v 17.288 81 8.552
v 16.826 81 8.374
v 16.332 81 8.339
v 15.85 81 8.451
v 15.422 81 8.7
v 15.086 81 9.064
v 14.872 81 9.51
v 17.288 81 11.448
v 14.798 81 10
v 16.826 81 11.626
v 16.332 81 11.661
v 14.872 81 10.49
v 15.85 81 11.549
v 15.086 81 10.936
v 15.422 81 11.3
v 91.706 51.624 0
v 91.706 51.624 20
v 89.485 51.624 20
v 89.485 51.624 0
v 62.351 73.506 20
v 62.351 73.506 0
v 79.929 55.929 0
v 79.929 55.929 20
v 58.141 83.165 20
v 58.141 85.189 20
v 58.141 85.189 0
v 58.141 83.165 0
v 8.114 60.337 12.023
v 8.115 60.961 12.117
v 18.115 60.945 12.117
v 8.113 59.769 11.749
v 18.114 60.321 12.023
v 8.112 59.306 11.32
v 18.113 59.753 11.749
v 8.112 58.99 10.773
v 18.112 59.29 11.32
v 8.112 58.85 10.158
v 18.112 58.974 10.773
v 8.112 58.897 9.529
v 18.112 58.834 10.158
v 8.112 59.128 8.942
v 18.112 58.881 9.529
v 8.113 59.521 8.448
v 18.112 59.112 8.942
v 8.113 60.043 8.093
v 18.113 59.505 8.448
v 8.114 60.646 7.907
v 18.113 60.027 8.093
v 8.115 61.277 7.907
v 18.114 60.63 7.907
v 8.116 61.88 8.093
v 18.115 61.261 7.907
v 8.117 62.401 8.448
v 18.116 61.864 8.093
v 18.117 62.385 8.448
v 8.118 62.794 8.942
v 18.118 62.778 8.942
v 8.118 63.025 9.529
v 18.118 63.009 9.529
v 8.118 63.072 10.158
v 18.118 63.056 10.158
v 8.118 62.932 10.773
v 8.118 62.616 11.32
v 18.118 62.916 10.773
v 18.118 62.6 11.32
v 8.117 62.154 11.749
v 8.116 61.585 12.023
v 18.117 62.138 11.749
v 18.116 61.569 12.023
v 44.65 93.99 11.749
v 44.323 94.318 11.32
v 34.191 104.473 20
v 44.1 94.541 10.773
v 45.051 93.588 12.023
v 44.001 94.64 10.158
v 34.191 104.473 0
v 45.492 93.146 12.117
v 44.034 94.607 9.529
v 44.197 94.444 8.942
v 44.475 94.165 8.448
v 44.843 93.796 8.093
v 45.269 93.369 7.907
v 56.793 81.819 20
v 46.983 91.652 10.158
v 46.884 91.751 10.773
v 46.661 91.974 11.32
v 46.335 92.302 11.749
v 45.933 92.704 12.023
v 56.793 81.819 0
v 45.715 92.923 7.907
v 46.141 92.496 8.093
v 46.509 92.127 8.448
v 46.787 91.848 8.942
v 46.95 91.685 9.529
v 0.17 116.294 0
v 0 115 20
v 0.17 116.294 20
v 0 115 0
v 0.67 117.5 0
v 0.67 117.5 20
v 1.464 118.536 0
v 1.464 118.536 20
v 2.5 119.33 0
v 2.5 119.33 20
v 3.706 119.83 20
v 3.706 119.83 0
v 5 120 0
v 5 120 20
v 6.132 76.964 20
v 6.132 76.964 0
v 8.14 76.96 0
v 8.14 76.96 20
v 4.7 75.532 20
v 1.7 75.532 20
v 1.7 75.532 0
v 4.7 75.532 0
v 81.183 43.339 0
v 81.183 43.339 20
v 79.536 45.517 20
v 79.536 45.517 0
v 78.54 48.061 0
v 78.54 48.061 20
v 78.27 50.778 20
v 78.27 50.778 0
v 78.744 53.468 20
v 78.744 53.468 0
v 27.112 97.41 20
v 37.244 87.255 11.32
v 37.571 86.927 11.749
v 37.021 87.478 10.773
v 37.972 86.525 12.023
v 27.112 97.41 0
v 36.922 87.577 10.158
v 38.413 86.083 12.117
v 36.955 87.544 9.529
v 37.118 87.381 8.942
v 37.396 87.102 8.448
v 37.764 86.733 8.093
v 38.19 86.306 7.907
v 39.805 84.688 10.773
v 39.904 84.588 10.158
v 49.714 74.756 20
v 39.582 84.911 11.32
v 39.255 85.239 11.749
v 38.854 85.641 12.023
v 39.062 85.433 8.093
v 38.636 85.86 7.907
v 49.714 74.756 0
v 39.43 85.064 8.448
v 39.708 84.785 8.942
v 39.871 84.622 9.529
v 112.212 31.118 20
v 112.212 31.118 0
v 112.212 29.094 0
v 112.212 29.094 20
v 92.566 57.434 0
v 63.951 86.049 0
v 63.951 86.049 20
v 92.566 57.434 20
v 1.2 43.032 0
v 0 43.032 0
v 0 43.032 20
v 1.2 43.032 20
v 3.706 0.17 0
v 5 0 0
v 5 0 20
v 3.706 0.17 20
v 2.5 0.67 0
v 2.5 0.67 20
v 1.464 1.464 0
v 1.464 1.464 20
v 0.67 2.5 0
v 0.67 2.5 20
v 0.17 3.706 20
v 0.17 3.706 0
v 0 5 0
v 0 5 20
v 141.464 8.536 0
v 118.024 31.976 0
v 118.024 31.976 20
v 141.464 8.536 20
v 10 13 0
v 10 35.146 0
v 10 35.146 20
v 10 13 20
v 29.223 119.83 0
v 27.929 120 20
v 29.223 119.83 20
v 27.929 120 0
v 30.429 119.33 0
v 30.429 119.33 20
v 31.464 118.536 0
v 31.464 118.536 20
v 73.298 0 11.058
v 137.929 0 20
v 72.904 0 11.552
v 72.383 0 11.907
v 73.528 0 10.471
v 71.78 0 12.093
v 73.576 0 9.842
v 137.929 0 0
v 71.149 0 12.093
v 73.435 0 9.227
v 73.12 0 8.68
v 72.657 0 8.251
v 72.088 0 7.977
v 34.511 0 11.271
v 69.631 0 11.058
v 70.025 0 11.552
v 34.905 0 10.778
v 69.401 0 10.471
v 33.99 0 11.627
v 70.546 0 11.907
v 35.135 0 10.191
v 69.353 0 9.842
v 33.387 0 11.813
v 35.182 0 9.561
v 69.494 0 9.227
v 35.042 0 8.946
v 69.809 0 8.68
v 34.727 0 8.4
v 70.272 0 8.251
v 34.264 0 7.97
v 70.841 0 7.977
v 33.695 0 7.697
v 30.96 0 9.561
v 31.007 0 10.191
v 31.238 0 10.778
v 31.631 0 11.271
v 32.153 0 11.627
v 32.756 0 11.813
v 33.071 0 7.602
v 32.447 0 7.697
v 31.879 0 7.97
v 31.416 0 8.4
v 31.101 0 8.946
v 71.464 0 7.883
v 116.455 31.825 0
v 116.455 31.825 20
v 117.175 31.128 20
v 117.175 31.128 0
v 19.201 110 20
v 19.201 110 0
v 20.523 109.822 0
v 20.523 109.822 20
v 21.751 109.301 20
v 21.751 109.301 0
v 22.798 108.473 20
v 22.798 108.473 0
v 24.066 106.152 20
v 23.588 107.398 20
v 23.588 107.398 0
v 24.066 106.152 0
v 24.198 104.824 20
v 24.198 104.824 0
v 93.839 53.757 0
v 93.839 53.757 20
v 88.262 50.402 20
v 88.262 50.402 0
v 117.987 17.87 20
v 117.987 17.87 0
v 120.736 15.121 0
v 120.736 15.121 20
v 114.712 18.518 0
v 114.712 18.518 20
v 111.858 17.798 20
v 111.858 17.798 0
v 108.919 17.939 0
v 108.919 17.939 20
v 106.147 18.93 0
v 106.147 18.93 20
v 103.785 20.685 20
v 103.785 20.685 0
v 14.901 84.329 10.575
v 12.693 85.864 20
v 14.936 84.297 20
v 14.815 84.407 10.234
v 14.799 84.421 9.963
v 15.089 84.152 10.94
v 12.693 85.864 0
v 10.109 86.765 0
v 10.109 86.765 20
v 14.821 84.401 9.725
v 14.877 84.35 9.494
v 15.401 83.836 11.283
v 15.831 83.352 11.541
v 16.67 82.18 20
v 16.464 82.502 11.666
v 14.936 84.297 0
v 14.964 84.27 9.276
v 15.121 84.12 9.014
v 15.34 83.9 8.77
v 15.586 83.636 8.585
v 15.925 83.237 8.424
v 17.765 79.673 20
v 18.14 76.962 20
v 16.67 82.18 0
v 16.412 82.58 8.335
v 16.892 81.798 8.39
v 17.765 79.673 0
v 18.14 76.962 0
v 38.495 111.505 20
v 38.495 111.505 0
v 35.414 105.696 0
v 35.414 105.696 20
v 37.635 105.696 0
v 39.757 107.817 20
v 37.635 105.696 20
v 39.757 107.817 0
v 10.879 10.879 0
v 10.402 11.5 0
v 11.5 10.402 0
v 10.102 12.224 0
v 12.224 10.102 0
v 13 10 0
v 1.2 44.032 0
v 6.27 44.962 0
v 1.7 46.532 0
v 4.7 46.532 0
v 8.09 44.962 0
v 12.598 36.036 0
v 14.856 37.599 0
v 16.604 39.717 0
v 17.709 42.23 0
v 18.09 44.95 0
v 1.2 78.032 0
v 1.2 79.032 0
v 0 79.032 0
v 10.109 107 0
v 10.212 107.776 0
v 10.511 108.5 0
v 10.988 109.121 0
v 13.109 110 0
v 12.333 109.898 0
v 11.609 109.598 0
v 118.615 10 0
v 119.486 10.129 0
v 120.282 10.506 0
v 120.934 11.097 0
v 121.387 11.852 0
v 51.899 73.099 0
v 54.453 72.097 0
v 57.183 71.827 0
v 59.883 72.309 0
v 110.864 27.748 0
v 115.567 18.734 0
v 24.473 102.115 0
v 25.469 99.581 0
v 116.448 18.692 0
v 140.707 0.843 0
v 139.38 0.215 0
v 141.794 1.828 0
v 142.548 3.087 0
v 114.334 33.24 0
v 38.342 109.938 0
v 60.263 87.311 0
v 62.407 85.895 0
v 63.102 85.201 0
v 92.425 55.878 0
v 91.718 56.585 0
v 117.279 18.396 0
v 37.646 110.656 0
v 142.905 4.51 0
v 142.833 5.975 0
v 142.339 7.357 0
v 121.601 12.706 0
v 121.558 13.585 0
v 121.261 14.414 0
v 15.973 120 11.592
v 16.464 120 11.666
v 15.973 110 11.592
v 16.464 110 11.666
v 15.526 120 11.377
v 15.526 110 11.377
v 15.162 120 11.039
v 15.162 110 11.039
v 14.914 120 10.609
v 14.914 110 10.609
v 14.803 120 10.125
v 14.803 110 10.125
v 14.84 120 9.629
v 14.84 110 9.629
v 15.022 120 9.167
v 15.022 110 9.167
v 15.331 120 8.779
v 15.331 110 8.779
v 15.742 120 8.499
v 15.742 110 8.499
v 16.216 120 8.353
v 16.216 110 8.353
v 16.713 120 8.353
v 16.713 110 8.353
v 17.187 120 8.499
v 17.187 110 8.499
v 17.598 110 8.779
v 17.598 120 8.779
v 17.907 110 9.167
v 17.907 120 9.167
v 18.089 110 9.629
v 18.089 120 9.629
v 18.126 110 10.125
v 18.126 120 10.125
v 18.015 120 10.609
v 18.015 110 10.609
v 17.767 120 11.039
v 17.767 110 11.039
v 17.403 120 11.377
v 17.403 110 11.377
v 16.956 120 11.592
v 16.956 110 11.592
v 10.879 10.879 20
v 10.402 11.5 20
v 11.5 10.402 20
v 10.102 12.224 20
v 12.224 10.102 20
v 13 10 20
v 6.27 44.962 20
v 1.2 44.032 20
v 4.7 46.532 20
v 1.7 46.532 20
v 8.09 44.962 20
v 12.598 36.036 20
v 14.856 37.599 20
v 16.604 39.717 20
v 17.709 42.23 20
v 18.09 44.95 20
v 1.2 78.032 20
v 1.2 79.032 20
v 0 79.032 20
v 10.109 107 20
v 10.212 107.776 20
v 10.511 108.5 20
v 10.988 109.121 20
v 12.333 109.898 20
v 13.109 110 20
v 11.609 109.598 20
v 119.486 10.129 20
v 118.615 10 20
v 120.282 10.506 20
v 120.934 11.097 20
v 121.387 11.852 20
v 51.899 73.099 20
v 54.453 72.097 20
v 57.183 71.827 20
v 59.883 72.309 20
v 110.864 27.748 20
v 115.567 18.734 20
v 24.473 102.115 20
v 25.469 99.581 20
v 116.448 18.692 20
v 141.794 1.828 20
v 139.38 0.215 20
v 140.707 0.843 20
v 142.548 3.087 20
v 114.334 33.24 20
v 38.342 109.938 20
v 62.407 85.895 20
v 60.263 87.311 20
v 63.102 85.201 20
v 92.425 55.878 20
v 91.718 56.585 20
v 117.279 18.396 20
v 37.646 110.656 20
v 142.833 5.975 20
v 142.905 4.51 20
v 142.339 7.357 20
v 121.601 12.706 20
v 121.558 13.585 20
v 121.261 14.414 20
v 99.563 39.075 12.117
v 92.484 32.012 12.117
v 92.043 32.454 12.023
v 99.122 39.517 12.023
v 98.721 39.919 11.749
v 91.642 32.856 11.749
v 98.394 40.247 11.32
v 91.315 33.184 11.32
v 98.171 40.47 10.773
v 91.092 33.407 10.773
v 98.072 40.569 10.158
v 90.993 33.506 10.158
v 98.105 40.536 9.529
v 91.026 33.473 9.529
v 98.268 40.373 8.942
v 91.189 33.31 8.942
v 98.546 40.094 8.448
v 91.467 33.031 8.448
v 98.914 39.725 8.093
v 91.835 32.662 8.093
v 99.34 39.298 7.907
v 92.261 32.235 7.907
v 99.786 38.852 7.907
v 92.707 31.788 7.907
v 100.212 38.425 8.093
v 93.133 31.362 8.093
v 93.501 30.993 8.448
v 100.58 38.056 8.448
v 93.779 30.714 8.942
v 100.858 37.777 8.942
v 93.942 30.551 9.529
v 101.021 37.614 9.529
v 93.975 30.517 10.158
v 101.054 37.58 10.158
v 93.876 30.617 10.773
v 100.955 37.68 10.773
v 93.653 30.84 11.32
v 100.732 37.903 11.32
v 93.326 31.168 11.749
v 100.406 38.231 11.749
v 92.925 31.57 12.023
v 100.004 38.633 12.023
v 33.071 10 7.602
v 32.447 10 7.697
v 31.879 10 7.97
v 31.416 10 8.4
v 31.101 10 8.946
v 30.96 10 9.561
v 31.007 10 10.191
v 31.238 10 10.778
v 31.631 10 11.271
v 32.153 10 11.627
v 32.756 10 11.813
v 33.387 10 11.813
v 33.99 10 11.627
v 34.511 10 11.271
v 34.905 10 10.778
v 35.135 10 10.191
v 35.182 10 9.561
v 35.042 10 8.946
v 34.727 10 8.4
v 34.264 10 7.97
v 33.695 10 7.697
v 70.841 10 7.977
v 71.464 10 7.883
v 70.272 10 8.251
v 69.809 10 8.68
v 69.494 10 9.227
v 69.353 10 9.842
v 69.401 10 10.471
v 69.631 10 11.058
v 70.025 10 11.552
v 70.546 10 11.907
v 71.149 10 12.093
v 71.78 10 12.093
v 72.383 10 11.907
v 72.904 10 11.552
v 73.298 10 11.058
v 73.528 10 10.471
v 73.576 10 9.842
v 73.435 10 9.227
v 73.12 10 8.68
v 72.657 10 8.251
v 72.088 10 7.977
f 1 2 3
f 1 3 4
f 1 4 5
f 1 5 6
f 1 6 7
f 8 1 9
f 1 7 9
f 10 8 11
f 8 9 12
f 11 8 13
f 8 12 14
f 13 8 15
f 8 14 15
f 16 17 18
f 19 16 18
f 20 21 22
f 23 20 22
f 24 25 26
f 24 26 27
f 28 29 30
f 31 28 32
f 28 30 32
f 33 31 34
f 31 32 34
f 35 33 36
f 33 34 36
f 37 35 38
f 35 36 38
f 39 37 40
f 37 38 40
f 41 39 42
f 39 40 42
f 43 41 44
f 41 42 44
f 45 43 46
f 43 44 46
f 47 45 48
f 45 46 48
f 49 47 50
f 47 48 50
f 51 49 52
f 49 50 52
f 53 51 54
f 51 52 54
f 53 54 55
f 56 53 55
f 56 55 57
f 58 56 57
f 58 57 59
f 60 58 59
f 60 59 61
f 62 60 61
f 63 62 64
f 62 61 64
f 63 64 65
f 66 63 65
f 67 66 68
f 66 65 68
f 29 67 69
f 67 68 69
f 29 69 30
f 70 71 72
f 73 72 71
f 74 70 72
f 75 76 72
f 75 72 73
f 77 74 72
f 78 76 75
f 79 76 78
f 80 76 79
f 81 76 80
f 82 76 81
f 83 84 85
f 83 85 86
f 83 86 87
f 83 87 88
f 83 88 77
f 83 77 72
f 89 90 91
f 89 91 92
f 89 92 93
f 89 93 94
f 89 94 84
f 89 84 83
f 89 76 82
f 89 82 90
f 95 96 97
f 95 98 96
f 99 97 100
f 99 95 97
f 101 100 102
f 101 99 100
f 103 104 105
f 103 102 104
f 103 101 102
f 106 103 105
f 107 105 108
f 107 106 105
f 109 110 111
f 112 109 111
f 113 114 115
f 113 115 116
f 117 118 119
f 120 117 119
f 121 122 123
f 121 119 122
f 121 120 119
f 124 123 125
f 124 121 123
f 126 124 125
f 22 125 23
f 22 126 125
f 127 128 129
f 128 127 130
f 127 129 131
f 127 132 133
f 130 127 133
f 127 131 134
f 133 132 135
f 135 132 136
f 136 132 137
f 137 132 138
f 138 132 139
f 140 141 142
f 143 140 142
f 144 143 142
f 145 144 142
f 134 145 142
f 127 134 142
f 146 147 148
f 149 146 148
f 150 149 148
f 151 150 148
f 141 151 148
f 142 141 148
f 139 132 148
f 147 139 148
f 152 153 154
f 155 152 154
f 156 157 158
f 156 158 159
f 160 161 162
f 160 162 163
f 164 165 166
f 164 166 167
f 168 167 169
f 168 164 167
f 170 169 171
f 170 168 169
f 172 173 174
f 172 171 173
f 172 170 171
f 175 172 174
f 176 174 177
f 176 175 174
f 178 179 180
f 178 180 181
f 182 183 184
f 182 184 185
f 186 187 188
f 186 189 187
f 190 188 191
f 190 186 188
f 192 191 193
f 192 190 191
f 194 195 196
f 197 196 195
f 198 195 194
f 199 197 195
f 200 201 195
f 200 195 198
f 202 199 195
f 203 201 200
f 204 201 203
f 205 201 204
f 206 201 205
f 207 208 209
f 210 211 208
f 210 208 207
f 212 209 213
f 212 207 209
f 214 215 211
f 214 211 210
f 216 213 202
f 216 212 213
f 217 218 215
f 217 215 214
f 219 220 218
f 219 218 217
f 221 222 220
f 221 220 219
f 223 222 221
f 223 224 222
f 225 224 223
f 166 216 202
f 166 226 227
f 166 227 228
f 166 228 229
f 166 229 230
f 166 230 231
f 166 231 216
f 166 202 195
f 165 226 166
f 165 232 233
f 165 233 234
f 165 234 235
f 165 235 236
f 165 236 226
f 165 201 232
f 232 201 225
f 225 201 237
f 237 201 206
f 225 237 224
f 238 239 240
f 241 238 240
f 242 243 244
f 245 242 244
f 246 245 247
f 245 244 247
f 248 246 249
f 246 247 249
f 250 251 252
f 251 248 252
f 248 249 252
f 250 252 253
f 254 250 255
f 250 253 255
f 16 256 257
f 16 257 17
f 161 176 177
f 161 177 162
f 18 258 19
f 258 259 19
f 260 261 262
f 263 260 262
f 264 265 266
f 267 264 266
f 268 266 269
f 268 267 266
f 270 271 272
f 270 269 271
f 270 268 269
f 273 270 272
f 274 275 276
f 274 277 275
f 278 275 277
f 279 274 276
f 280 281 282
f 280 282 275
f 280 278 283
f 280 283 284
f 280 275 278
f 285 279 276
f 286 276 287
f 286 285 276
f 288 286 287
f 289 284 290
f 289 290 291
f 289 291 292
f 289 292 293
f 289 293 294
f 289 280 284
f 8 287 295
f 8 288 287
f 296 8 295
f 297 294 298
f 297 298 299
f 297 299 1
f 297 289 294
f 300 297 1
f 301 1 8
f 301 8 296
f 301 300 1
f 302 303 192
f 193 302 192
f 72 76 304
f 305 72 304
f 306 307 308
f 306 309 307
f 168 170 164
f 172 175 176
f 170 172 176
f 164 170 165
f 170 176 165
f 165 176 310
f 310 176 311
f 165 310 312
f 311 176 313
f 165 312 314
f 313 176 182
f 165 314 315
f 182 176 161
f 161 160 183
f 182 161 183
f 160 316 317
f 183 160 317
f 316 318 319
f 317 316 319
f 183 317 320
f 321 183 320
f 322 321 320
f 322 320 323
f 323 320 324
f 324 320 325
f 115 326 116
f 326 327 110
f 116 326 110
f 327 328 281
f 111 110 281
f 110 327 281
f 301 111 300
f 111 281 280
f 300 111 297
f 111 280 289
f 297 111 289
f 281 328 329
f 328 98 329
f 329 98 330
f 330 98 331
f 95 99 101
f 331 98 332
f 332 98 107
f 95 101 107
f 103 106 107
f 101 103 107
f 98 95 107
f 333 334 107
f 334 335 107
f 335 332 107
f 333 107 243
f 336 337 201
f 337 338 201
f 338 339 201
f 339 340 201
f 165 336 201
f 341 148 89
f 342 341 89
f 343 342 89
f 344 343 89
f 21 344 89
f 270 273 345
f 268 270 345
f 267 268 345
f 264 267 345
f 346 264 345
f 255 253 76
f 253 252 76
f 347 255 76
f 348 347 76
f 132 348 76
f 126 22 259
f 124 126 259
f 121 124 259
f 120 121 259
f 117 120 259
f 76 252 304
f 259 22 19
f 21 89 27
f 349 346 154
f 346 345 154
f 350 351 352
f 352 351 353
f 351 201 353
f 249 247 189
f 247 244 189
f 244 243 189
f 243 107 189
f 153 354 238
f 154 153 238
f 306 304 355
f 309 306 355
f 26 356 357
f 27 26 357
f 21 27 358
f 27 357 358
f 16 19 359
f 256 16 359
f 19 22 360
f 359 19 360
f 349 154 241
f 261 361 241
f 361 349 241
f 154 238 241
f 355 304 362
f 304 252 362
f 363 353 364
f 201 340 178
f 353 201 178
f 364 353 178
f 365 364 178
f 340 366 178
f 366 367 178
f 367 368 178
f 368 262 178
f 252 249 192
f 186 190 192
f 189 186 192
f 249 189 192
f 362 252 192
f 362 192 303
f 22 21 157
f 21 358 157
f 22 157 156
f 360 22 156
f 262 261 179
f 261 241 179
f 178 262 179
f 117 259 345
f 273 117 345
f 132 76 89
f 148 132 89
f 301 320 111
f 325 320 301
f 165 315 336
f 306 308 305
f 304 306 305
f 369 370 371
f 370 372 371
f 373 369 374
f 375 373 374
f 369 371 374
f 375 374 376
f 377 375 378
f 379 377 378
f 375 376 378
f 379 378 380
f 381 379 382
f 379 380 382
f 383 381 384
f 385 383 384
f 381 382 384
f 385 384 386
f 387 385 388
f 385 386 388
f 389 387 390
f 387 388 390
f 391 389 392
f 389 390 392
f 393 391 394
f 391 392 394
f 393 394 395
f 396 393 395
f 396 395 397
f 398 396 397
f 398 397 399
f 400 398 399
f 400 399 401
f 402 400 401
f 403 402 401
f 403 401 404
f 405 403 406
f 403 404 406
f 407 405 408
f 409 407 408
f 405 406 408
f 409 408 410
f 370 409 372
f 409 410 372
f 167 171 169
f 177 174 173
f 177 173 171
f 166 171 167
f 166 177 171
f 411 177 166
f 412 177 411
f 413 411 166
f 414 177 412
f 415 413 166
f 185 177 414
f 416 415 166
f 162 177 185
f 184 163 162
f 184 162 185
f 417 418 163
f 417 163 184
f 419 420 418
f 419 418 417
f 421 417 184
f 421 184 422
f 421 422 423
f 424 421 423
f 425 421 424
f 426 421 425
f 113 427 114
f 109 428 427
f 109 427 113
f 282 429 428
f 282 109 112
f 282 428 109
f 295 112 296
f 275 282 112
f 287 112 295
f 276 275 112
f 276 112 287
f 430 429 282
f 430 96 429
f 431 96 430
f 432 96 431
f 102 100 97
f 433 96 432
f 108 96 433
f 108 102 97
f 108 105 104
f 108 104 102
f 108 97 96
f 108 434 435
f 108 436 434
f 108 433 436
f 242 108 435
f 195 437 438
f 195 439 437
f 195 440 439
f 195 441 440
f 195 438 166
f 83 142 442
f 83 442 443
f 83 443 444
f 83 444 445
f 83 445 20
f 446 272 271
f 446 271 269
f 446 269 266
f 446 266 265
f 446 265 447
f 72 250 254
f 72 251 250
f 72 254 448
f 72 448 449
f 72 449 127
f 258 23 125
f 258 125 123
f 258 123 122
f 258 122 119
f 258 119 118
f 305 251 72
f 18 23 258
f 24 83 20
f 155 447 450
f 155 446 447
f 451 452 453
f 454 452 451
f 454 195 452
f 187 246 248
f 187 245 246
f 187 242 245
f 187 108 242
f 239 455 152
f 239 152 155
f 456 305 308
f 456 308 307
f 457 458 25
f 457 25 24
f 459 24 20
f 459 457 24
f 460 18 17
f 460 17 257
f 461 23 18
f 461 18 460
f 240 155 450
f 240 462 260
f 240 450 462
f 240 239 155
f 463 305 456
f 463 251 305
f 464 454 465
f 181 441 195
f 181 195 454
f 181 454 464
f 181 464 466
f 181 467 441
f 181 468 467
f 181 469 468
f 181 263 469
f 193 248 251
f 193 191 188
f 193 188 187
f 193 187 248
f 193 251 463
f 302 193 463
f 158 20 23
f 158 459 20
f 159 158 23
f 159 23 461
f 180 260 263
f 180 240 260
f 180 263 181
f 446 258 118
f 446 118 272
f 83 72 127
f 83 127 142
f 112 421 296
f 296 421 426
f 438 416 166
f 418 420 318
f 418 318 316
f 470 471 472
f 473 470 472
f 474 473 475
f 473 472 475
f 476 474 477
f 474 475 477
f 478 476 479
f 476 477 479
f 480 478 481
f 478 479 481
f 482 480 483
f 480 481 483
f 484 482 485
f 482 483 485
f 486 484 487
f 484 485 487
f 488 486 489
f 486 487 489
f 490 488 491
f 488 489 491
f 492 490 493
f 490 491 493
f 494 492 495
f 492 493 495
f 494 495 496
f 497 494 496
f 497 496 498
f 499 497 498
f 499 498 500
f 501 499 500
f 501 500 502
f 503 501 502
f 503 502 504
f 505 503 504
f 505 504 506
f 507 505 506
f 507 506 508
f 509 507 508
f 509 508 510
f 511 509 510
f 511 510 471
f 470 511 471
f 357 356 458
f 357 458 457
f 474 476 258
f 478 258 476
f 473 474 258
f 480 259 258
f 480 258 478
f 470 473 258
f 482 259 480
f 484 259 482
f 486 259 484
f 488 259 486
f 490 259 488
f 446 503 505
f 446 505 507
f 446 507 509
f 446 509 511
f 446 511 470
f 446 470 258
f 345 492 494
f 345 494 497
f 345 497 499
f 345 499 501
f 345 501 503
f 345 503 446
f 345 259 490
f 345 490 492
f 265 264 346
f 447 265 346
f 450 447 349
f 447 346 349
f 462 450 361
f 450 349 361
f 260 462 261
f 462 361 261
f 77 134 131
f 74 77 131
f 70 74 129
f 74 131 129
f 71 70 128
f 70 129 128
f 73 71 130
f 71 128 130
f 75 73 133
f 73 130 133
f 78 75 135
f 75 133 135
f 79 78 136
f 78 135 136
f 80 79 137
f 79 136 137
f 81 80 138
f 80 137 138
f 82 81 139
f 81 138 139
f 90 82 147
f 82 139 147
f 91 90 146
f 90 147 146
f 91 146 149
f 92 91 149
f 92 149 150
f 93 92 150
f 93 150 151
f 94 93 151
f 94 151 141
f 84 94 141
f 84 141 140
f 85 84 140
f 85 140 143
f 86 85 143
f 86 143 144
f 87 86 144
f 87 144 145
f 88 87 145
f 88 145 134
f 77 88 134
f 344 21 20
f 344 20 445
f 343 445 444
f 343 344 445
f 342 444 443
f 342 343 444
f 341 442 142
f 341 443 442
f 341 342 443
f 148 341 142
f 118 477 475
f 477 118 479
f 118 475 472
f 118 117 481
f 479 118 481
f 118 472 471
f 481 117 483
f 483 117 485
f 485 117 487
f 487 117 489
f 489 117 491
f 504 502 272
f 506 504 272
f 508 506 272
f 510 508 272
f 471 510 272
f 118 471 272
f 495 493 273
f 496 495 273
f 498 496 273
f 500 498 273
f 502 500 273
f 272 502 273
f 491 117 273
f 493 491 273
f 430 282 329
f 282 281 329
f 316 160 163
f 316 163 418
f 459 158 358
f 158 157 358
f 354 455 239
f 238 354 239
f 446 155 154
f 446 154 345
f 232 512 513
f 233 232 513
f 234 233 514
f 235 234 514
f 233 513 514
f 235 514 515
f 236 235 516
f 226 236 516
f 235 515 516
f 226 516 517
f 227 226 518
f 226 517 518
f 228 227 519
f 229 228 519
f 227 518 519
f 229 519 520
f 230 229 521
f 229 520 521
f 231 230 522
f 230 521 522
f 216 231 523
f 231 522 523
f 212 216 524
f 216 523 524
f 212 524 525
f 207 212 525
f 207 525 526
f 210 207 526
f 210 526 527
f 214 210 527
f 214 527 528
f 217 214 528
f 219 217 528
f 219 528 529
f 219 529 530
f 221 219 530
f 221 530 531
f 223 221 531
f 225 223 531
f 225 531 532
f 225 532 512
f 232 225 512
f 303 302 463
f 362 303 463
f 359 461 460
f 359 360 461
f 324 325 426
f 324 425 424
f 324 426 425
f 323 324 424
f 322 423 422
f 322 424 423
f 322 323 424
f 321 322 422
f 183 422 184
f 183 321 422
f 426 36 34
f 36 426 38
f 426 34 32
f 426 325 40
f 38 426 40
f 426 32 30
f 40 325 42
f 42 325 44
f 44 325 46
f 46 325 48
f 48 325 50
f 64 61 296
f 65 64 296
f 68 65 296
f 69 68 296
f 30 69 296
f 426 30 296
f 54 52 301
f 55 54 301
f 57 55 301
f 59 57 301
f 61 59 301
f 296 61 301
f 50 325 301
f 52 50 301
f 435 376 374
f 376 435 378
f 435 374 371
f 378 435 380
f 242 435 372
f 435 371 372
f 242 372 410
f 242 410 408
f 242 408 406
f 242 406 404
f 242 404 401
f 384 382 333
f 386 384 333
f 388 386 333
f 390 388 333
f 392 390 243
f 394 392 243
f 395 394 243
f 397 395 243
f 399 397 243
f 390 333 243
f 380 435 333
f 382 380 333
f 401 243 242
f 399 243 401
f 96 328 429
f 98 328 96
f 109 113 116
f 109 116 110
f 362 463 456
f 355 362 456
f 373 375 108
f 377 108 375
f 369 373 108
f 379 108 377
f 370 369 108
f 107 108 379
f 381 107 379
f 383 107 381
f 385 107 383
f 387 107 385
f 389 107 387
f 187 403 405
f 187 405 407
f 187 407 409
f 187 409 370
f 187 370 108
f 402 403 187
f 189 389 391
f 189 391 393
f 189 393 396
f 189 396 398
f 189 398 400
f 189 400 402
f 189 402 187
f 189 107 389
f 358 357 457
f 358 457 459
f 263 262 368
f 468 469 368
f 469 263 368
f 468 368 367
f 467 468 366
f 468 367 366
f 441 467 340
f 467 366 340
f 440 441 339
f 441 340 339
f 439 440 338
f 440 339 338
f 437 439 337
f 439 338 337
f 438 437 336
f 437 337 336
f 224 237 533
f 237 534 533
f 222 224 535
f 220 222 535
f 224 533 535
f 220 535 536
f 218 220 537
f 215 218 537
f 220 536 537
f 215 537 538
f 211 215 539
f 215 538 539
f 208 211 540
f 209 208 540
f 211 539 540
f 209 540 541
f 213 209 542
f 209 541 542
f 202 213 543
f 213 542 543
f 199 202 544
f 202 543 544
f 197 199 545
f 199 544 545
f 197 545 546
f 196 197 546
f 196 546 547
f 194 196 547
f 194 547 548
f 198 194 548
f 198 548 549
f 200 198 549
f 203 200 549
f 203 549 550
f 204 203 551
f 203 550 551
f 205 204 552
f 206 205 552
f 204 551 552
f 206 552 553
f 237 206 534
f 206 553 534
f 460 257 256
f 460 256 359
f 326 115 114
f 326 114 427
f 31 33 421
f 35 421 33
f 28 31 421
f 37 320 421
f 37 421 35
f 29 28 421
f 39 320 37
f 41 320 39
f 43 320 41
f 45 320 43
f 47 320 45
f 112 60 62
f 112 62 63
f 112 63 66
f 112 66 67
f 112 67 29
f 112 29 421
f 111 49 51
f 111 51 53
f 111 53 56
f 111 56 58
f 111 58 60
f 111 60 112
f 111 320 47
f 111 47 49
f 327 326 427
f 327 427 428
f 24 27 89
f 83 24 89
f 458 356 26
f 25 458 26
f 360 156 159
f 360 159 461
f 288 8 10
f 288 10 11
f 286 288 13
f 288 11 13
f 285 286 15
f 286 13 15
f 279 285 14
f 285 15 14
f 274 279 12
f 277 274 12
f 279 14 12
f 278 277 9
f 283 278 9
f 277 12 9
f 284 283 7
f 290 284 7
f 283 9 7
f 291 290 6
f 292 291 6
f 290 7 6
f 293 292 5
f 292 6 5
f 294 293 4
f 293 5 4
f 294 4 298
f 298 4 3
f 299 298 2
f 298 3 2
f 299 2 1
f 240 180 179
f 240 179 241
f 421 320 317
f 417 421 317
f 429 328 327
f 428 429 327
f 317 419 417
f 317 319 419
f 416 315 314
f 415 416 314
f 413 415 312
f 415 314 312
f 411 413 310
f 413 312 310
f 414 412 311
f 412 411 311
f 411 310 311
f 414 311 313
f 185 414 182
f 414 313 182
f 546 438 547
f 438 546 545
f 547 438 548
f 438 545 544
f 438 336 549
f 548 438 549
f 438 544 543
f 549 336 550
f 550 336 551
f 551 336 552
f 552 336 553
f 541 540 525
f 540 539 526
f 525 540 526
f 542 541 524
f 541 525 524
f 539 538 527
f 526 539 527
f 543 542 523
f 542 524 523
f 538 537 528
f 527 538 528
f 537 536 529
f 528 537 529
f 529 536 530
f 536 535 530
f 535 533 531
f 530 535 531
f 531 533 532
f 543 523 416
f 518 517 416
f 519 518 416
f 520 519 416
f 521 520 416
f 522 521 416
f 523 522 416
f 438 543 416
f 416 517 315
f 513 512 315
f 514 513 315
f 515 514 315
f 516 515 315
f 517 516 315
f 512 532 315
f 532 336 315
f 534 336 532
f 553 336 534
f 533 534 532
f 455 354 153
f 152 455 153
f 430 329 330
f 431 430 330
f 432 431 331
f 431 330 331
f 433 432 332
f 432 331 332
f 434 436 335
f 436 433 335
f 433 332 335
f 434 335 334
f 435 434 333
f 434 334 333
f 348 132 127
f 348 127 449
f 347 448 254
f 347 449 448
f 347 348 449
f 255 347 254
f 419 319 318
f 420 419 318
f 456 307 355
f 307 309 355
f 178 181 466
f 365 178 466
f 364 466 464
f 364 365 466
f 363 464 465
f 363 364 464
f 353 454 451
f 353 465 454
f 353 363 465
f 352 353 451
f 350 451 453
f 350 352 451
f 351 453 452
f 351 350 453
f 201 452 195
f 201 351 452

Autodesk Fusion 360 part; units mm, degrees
sketch "スケッチ16" plane through (0, 0, 0) normal (0, 0, 1) x (1, 0, 0)
  line L0 (8.0897, 44.9617) -> (8.1401, 76.9604)
  line L1 (0, 79.0322) -> (1.2, 79.0322)
  line L2 (0, 43.0322) -> (1.2, 43.0322)
  line L3 (0, 5) -> (0, 43.0322)
  arc A0 (5, 120) -> (0, 115) centre (5, 115) ccw
  line L4 (5, 120) -> (27.9289, 120)
  line L5 (137.9289, 0) -> (5, 0)
  arc A1 (0, 5) -> (5, 0) centre (5, 5) ccw
  line L6 (1.7, 75.5322) -> (1.2, 78.0322)
  line L7 (1.2, 43.0322) -> (1.2, 44.0322)
  line L8 (1.7, 75.5322) -> (4.7001, 75.5322)
  line L9 (1.2, 78.0322) -> (1.2, 79.0322)
  line L10 (10.1094, 86.7646) -> (10.1094, 107)
  line L11 (18.0897, 44.9502) -> (18.1401, 76.9623)
  line L12 (8.0897, 44.9617) -> (6.2705, 44.9617)
  arc A2 (18.1401, 76.9623) -> (10.1094, 86.7646) centre (8.1401, 76.9604) ccw
  line L13 (10, 35.1459) -> (10, 13)
  arc A3 (10, 35.1459) -> (18.0897, 44.9502) centre (8.0897, 44.9617) ccw
  arc A4 (49.7137, 74.7564) -> (62.3513, 73.5065) centre (56.7929, 81.8194) ccw
  line L14 (27.1123, 97.4097) -> (49.7137, 74.7564)
  arc A5 (24.1976, 104.8242) -> (27.1123, 97.4097) centre (34.1914, 104.4726) ccw
  line L15 (58.1413, 85.1894) -> (58.1413, 83.1647)
  line L16 (60.2627, 87.3108) -> (58.1413, 85.1894)
  line L17 (60.2627, 87.3108) -> (62.4073, 85.8948)
  line L18 (62.4073, 85.8948) -> (63.1023, 85.2006)
  line L19 (63.9508, 86.0492) -> (63.1023, 85.2006)
  line L20 (37.6352, 105.6955) -> (35.4143, 105.6955)
  line L21 (39.7566, 107.8168) -> (37.6352, 105.6955)
  line L22 (39.7566, 107.8168) -> (38.3423, 109.9382)
  line L23 (37.6465, 110.6565) -> (38.3423, 109.9382)
  line L24 (38.495, 111.505) -> (37.6465, 110.6565)
  line L25 (62.3513, 73.5065) -> (79.9289, 55.9289)
  line L26 (13.1094, 110) -> (19.2007, 110)
  line L27 (112.2124, 31.1183) -> (112.2124, 29.0936)
  line L28 (93.8389, 53.757) -> (91.7063, 51.6244)
  line L29 (88.2625, 50.4016) -> (110.864, 27.7483)
  line L30 (88.2625, 50.4016) -> (89.4854, 51.6244)
  line L31 (114.3337, 33.2397) -> (116.455, 31.8254)
  line L32 (114.3337, 33.2397) -> (112.2124, 31.1183)
  line L33 (91.7063, 51.6244) -> (89.4854, 51.6244)
  line L34 (91.7175, 56.5854) -> (92.4246, 55.8783)
  line L35 (81.1833, 43.3386) -> (103.7848, 20.6853)
  arc A6 (103.7848, 20.6853) -> (114.7117, 18.5182) centre (110.864, 27.7483) ccw
  line L36 (118.0236, 31.9764) -> (117.1751, 31.1279)
  arc A7 (79.9289, 55.9289) -> (81.1833, 43.3386) centre (88.2625, 50.4016) ccw
  line L37 (116.455, 31.8254) -> (117.1751, 31.1279)
  line L38 (93.8389, 53.757) -> (92.4246, 55.8783)
  line L39 (92.5661, 57.4339) -> (91.7175, 56.5854)
  line L40 (117.9874, 17.8705) -> (120.7365, 15.1213)
  arc A8 (13.1094, 110) -> (10.1094, 107) centre (13.1094, 107) ccw
  arc A9 (24.1976, 104.8242) -> (19.2007, 110) centre (19.2007, 105) ccw
  line L41 (118.6152, 10) -> (13, 10)
  arc A10 (10, 13) -> (13, 10) centre (13, 13) ccw
  arc A11 (118.6152, 10) -> (120.7365, 15.1213) centre (118.6152, 13) ccw
  line L42 (0, 79.0322) -> (0, 115)
  line L43 (38.495, 111.505) -> (31.4645, 118.5355)
  line L44 (63.9508, 86.0492) -> (92.5661, 57.4339)
  line L45 (118.0236, 31.9764) -> (141.4645, 8.5355)
  arc A12 (117.9874, 17.8705) -> (114.7117, 18.5182) centre (115.8661, 15.7491) ccw
  arc A13 (31.4645, 118.5355) -> (27.9289, 120) centre (27.9289, 115) ccw
  line L46 (4.7001, 75.5322) -> (6.1315, 76.9636)
  line L47 (4.7, 46.5322) -> (6.2705, 44.9617)
  arc A14 (137.9289, 0) -> (141.4645, 8.5355) centre (137.9289, 5) ccw
  line L48 (34.1914, 104.4726) -> (56.7929, 81.8194)
  line L49 (34.1914, 104.4726) -> (35.4143, 105.6955)
  line L50 (58.1413, 83.1647) -> (56.7929, 81.8194)
  line L51 (6.1315, 76.9636) -> (8.1401, 76.9604)
  line L52 (112.2124, 29.0936) -> (110.864, 27.7483)
  line L53 (4.7, 46.5322) -> (1.7, 46.5322)
  line L54 (1.7, 46.5322) -> (1.2, 44.0322)
  line L55 (8.0897, 44.9617) -> (8.1149, 60.9611)
extrude "押し出し1" add sketch "スケッチ16" along normal blind 20
hole "穴1" at (8.1149, 60.9611, 10) direction (1, -0.0016, 0) diameter 4.234 depth 13 tip angle 118
hole "穴2" at (99.5632, 39.0749, 10) direction (-0.7079, -0.7063, 0) diameter 4.234 depth 13 tip angle 118
hole "穴3" at (45.4922, 93.146, 10) direction (-0.7079, -0.7063, 0) diameter 4.234 depth 13 tip angle 118
hole "穴4" at (71.4645, 0, 10) direction (0, 1, 0) diameter 4.234 depth 13 tip angle 118
hole "穴5" at (33.0714, 0, 9.7195) direction (0, 1, 0) diameter 4.234 depth 13 tip angle 118
hole "穴6" at (16.4645, 120, 10) direction (0, -1, 0) diameter 3.332 depth 39 tip angle 180
